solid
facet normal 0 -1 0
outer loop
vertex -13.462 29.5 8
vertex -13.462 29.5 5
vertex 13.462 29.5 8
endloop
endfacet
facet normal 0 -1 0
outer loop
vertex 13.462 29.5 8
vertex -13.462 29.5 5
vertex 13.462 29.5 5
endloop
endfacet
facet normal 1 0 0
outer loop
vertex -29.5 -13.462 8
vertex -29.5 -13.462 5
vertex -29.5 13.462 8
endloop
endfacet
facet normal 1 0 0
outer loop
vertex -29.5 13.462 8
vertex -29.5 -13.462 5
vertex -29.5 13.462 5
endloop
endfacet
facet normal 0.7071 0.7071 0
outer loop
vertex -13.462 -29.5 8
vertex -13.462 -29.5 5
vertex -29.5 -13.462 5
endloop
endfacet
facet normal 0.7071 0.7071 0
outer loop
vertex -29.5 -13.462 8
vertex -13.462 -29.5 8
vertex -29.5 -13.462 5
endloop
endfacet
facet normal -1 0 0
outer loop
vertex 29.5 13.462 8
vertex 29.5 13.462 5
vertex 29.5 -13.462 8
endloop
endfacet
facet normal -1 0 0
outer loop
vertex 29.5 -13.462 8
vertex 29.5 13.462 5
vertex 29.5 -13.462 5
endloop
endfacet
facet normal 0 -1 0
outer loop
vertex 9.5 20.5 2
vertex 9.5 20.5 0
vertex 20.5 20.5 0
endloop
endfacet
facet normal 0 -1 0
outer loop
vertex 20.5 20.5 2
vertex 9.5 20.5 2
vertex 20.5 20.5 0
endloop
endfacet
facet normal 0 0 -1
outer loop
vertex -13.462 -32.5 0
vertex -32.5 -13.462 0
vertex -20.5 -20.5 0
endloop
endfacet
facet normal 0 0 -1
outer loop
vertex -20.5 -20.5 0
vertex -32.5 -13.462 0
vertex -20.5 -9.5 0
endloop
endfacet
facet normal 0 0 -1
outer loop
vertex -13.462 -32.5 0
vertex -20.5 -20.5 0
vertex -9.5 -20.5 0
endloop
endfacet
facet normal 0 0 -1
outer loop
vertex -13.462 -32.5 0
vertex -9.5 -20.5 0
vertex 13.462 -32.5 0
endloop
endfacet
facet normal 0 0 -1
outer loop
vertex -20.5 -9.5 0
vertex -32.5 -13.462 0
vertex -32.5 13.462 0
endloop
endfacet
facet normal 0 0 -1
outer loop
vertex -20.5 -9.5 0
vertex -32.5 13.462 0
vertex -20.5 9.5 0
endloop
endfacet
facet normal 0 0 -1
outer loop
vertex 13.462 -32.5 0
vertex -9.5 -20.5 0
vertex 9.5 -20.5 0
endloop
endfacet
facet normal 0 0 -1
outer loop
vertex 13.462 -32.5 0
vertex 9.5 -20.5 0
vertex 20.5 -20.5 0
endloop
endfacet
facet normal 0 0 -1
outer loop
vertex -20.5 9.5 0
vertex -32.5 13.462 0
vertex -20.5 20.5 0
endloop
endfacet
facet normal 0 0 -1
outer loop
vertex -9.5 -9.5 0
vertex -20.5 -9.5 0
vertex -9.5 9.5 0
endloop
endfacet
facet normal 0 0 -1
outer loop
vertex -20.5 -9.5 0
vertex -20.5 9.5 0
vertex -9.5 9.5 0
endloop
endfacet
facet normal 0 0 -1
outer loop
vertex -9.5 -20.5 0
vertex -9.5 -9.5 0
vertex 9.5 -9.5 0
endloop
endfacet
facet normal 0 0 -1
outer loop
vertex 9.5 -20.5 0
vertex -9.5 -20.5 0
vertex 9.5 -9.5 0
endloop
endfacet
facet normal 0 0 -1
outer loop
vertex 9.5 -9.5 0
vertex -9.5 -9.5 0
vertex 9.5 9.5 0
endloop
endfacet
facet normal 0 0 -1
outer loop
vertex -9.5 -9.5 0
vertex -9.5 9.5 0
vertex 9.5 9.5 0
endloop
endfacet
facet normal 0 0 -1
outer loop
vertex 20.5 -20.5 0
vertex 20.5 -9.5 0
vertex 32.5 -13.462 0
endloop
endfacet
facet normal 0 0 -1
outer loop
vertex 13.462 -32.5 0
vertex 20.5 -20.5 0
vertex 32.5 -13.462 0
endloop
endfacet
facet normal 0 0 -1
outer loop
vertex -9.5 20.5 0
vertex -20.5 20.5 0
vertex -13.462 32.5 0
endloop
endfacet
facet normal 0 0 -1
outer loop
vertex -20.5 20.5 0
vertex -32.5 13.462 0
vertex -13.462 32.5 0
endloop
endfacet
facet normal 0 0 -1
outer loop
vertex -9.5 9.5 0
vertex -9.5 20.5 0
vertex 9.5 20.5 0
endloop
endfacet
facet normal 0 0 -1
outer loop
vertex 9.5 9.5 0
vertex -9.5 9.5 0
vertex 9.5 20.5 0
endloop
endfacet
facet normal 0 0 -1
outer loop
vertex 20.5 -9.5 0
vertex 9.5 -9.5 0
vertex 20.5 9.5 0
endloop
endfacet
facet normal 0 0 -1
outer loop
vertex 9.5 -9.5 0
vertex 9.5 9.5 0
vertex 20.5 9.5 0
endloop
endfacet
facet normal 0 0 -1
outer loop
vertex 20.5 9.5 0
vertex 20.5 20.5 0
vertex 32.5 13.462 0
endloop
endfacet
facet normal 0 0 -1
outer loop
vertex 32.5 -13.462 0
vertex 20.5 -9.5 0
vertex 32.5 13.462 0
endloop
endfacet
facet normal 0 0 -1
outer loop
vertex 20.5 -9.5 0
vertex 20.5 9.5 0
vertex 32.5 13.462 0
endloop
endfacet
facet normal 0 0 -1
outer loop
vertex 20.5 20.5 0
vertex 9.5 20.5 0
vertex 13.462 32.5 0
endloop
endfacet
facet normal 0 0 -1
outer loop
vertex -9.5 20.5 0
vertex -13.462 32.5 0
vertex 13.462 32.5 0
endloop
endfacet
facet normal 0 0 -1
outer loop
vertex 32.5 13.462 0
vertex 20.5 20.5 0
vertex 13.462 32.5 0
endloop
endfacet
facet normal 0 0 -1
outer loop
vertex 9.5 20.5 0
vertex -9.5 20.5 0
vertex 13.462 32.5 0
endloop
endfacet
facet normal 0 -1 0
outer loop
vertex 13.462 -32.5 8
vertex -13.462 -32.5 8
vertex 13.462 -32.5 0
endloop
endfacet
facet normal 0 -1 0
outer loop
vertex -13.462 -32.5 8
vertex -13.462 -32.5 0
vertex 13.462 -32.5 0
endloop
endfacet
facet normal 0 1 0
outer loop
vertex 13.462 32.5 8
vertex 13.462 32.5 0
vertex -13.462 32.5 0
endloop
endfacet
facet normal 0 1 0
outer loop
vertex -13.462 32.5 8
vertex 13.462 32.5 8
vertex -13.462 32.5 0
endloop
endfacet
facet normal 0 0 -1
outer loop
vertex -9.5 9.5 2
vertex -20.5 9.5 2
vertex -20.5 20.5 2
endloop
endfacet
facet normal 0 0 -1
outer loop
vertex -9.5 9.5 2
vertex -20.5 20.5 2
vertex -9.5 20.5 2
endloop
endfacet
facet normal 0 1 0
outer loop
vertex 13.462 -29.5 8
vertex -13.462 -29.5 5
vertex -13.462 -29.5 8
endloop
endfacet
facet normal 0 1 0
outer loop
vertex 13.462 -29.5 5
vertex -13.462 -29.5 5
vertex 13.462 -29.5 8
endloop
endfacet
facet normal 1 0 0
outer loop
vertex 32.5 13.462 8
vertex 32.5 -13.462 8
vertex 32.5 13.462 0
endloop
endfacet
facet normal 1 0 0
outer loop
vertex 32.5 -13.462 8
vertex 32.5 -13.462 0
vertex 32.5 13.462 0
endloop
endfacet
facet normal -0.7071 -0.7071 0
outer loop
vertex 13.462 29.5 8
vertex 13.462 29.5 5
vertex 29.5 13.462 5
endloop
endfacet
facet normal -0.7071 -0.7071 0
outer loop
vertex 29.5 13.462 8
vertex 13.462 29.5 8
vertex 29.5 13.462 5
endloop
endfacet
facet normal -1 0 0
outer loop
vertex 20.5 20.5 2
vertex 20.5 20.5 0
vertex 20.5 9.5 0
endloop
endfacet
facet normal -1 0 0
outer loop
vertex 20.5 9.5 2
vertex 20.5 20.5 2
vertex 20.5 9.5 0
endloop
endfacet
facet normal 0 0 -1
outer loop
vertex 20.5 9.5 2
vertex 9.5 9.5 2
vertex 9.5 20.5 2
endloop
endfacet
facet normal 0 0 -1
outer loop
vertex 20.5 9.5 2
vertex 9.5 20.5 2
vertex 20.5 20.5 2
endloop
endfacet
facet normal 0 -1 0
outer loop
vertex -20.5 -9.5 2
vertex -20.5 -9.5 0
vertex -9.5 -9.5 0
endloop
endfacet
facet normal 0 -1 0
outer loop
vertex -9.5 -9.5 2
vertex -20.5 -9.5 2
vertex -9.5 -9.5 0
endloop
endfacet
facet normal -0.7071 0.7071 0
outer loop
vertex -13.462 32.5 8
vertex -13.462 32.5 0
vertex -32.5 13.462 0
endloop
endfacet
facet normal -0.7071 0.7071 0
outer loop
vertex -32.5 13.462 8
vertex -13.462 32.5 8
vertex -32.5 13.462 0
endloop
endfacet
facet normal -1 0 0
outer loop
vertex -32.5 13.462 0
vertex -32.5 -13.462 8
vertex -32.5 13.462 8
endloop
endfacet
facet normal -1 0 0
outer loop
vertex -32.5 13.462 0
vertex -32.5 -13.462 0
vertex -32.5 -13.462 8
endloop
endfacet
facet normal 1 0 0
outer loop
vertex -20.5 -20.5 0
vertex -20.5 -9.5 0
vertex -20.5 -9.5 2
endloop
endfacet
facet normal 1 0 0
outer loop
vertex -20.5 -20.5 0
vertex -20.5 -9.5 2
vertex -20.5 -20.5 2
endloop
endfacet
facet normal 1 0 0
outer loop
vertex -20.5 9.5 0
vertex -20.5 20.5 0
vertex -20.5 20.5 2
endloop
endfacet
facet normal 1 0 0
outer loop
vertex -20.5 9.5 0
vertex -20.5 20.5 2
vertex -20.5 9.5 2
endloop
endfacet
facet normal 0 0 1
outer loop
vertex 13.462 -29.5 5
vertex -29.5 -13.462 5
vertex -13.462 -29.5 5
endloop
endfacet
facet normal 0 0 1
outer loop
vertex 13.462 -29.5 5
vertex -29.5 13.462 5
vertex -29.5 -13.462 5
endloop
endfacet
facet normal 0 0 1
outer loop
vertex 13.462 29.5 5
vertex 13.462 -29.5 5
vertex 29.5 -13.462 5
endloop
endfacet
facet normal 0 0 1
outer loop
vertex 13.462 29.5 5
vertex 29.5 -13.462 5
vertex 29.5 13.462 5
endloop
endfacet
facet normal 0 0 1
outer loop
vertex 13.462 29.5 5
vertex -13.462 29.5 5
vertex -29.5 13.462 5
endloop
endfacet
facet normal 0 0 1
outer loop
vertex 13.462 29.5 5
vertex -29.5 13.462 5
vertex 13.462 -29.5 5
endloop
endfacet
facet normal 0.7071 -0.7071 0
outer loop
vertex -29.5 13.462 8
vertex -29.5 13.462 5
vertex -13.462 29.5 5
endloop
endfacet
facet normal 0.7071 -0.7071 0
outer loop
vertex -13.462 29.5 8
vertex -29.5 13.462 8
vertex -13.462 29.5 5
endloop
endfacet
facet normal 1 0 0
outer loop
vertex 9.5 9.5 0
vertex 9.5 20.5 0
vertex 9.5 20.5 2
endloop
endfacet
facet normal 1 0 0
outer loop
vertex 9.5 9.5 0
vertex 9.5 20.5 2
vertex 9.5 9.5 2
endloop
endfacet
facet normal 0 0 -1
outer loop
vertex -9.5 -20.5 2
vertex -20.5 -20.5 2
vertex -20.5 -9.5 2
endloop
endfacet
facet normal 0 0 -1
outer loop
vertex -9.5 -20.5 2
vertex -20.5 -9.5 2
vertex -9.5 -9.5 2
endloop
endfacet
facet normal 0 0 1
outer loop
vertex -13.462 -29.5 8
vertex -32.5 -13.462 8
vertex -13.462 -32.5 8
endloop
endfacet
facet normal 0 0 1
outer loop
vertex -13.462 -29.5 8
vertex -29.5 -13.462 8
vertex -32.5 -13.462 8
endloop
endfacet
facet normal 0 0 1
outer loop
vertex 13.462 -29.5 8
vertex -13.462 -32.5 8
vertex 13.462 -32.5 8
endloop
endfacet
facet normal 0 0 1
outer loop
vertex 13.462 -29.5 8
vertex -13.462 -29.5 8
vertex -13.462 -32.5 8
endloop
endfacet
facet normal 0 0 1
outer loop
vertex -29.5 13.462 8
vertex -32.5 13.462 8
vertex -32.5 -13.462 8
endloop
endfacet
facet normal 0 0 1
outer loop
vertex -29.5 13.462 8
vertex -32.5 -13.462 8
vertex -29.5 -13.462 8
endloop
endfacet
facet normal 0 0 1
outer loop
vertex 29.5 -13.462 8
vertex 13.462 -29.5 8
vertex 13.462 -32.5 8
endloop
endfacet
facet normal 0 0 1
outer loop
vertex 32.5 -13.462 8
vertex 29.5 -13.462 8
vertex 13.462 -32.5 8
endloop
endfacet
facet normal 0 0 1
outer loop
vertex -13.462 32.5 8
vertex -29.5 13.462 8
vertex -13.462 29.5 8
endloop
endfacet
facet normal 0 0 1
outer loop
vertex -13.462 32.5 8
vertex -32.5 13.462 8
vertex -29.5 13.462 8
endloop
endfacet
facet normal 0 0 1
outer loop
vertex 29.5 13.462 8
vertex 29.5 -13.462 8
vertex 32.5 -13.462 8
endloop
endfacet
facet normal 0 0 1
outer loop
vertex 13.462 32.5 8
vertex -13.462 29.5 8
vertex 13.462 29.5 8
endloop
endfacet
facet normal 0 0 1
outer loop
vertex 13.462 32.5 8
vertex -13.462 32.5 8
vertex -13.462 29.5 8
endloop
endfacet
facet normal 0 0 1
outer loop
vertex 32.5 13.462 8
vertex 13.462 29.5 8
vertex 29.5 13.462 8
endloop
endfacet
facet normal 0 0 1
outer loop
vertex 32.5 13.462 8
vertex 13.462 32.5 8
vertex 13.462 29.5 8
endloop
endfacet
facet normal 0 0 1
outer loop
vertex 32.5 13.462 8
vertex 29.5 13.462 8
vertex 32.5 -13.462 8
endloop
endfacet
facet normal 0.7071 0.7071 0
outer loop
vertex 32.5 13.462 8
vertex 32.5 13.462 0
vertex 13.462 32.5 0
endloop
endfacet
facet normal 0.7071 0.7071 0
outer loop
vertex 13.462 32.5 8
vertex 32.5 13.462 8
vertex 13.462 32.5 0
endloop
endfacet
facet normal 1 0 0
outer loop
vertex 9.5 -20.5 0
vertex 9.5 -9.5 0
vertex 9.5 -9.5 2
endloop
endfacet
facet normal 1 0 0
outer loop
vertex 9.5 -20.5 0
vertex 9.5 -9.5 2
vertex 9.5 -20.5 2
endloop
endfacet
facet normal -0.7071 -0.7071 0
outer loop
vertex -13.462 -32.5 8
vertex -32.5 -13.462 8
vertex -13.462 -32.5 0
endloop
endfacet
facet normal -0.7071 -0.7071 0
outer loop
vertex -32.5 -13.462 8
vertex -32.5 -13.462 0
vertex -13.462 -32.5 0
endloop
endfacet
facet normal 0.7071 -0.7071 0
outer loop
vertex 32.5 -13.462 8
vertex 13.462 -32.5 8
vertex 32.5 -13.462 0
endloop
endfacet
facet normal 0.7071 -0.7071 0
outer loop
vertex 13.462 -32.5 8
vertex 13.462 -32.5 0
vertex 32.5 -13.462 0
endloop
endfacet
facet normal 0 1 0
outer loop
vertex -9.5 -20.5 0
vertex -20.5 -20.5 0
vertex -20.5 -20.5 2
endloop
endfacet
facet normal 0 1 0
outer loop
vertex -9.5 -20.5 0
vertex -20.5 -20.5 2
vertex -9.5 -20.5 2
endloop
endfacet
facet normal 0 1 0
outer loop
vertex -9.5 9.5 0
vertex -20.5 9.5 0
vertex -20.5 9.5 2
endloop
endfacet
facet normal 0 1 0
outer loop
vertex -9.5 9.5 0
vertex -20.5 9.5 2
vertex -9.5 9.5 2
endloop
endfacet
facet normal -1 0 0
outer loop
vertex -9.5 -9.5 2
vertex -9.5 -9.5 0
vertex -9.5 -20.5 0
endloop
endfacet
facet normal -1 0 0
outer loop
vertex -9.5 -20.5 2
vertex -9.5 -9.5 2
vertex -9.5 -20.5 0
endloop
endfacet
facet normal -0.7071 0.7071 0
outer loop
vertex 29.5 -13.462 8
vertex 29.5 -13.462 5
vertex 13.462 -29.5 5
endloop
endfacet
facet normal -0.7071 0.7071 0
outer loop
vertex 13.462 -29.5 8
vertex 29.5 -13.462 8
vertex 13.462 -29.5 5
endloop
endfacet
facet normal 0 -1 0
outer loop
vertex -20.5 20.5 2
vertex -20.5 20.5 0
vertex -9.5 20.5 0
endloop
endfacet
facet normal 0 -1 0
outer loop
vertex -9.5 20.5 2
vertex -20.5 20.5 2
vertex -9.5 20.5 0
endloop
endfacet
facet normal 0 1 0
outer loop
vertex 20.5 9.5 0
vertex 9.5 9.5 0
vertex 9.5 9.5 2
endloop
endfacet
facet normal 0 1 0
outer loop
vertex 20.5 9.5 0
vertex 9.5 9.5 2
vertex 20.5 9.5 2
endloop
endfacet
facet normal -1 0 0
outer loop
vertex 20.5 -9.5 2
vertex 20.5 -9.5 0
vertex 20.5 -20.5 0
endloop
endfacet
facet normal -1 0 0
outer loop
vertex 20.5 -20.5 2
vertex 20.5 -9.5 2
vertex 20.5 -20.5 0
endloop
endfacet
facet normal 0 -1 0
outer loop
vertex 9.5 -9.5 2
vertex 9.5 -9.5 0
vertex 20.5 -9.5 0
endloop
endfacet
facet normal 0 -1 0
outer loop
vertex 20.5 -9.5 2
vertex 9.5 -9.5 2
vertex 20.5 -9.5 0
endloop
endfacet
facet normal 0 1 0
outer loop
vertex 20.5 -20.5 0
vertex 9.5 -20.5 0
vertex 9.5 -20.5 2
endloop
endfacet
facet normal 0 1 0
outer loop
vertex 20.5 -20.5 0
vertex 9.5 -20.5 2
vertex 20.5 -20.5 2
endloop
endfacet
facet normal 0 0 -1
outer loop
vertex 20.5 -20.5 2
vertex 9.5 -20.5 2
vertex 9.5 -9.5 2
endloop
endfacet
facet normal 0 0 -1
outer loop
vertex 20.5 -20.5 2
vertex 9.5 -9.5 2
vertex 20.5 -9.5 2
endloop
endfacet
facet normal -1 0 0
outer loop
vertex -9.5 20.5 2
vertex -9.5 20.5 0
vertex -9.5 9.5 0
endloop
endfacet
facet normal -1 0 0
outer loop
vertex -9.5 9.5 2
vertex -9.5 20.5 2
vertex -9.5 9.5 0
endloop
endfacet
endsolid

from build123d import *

# Parameters (mm, degrees)
F1_DEPTH = 5
F2_W     = 3
F2_H     = 26.923882
F2_W_2   = 26.923882
F2_H_2   = 3
F3_DEPTH = 3
F4_W     = 11
F4_H     = 11
F5_DEPTH = 2


with BuildPart() as f1:
    # F0 (on Top) → F1 (new body)
    with BuildSketch(Plane.XY):
        Polygon((-13.461941, -32.5), (13.461941, -32.5), (32.5, -13.461941), (32.5, 13.461941), (13.461941, 32.5), (-13.461941, 32.5), (-32.5, 13.461941), (-32.5, -13.461941), align=None)
    extrude(amount=F1_DEPTH)

    # F2 (on face) → F3 (join)
    with BuildSketch(Plane.XY.offset(5)):
        Polygon((-13.461941, 32.5), (-32.5, 13.461941), (-29.5, 13.461941), (-13.461941, 29.5), (13.461941, 29.5), (29.5, 13.461941), (29.5, -13.461941), (32.5, -13.461941), (32.5, 13.461941), (13.461941, 32.5), align=None)
        with Locations((-31, 0)):
            Rectangle(F2_W, F2_H)
        Polygon((-29.5, -13.461941), (-32.5, -13.461941), (-13.461941, -32.5), (-13.461941, -29.5), align=None)
        with Locations((0, -31)):
            Rectangle(F2_W_2, F2_H_2)
        Polygon((13.461941, -29.5), (13.461941, -32.5), (32.5, -13.461941), (29.5, -13.461941), align=None)
    extrude(amount=F3_DEPTH)

    # F4 (on face) → F5 (cut)
    with BuildSketch(Plane(origin=(0, 0, 0), x_dir=(1, 0, 0), z_dir=(0, 0, -1))):
        with Locations((-15, 15)):
            Rectangle(F4_W, F4_H)
        with Locations((15, 15)):
            Rectangle(F4_W, F4_H)
        with Locations((15, -15)):
            Rectangle(F4_W, F4_H)
        with Locations((-15, -15)):
            Rectangle(F4_W, F4_H)
    extrude(amount=-F5_DEPTH, mode=Mode.SUBTRACT)


solid = f1.part
